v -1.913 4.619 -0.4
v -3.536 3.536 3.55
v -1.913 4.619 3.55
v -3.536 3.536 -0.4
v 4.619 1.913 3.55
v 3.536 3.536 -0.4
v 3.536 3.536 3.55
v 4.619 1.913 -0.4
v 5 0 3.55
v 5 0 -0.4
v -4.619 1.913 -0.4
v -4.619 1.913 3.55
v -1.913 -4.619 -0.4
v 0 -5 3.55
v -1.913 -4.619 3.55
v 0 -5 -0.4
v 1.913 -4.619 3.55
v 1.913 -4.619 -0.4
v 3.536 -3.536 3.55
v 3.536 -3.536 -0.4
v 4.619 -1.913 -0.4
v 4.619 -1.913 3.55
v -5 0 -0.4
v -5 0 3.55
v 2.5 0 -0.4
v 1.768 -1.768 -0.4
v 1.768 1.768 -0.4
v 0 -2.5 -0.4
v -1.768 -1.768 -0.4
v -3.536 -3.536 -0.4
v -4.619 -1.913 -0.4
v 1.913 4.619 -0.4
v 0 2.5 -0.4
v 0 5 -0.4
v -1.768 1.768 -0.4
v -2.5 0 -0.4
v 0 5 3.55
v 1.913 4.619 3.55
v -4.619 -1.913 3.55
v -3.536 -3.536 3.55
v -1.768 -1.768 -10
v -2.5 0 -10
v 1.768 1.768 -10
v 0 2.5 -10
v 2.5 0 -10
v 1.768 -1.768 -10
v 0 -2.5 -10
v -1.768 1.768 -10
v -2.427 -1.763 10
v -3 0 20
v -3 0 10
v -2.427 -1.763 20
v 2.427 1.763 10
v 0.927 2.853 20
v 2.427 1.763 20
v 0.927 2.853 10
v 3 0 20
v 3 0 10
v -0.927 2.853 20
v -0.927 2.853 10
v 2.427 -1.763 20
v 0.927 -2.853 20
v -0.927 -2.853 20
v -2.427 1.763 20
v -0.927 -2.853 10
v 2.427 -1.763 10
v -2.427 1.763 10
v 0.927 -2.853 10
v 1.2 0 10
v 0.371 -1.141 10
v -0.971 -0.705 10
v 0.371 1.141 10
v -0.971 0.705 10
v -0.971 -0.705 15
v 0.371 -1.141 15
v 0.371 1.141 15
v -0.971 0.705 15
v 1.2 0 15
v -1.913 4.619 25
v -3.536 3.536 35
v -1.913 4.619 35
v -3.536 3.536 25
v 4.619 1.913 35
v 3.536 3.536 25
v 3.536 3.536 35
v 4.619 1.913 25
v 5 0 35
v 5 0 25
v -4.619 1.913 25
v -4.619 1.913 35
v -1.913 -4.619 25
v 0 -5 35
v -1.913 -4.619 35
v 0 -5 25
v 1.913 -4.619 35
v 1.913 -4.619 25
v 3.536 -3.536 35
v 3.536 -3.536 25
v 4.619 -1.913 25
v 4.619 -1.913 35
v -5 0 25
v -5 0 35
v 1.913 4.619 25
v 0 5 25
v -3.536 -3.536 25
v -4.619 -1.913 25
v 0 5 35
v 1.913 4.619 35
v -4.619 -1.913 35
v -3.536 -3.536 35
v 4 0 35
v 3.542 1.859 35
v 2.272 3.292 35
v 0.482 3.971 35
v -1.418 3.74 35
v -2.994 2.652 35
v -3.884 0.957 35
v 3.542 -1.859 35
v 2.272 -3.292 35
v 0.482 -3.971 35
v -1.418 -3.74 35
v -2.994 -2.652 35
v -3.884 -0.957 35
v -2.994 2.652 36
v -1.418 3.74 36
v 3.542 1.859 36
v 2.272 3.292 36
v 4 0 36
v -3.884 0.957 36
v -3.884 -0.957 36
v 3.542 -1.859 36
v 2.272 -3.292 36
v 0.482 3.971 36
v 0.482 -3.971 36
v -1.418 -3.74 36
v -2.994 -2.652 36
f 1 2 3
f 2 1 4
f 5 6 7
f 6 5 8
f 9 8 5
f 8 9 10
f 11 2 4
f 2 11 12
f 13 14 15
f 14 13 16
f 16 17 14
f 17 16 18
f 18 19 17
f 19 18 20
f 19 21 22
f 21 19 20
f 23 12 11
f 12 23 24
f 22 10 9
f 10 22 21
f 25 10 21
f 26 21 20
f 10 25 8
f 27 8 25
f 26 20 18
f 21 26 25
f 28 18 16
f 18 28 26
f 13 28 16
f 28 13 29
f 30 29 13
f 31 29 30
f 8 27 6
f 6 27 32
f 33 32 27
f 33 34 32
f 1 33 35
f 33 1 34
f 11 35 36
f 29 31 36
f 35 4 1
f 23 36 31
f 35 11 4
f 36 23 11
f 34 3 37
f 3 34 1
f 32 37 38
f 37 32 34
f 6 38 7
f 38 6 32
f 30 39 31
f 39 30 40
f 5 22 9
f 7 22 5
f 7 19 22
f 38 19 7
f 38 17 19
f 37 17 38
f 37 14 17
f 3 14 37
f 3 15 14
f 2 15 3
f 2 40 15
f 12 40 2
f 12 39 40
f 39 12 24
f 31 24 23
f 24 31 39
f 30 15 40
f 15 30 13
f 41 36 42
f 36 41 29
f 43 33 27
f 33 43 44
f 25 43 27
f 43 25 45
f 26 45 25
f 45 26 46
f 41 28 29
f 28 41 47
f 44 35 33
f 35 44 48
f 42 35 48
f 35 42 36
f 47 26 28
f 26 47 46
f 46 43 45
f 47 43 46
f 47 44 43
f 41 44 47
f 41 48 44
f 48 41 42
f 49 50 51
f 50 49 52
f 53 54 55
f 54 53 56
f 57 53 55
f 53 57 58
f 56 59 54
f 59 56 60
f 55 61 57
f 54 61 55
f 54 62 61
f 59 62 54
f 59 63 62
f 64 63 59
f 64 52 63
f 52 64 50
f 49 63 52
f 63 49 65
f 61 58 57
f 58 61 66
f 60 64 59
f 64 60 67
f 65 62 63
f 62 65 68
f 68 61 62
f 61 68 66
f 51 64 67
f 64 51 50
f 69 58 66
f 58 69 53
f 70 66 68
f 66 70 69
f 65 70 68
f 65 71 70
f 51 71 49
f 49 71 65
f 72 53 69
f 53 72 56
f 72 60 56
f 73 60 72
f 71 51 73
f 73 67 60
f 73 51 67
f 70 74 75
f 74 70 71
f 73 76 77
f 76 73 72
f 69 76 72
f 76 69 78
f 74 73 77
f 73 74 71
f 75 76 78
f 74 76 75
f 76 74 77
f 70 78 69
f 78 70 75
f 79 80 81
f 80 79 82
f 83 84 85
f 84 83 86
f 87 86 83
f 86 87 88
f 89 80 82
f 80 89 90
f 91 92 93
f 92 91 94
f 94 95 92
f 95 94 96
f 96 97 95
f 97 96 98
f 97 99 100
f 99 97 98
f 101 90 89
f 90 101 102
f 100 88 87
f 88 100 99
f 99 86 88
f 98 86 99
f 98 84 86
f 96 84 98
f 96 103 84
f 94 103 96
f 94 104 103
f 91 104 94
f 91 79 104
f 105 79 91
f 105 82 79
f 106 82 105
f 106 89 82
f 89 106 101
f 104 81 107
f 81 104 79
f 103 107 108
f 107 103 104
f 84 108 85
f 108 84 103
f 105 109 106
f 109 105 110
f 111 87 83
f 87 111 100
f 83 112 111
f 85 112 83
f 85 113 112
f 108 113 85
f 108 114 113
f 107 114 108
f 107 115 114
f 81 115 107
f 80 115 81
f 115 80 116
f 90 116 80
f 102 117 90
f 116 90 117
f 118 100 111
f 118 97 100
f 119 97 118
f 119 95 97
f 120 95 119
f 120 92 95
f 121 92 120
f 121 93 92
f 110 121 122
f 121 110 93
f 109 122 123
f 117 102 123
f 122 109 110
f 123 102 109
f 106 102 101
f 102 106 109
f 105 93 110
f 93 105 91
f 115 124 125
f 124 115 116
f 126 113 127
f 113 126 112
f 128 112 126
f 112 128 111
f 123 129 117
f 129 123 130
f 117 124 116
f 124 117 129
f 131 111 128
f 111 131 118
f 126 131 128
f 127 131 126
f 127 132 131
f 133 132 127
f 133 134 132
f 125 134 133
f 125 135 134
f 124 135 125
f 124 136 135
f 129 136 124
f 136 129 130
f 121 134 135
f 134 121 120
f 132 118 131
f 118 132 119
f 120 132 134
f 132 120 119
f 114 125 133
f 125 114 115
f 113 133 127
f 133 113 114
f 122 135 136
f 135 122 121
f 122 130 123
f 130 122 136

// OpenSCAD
// Parameters
shank_diameter = 5; //[2.5:10:0.1]
length_under_head = 10; //[5:20:0.5]
head_diameter = 10; //[6:20:0.1]
head_height = 3.95; //[2:8:0.05]
threaded = 0; //[0:1:1]
drive_type_none = 1; //[0:1:1]
tip_type_chamfer = 1; //[0:1:1]
eps_overlap = 0.8; //[0.2:2:0.1]
shank_radius = 2.5; //[1.25:5:0.1]
head_radius = 5; //[3:10:0.1]
head_crown_radius = 6; //[3:12:0.1]
head_crown_center_z = 1.5; //[−2:6:0.1]
tip_chamfer_height = 1.2; //[0.5:3:0.1]
tip_point_radius2 = 0.6; //[0:2.5:0.1]
drive_recess_radius = 3; //[1.5:4.5:0.1]
drive_recess_depth = 2; //[0.8:3.5:0.1]
drive_recess_slot_width = 1; //[0.6:2:0.1]
drive_recess_overlap_z = 0.5; //[0.2:1.5:0.1]

// Screw and Washer
module screw_and_washer() {
  color("DimGray") {
    // Shank
    translate([0, 0, -length_under_head/2])
      cylinder(h=length_under_head, r=shank_radius, center=true);

    // Tip Chamfer
    translate([0, 0, -length_under_head + tip_chamfer_height/2])
      cylinder(h=tip_chamfer_height, r1=shank_radius, r2=tip_point_radius2, center=true);

    // Head
    intersection() {
      translate([0, 0, head_height/2 - eps_overlap/2])
        cylinder(h=head_height, r=head_radius, center=true);
      translate([0, 0, head_crown_center_z])
        sphere(r=head_crown_radius, center=true);
      translate([0, 0, head_height/2 - eps_overlap/2])
        cube([2*head_diameter, 2*head_diameter, head_height + 2*eps_overlap], center=true);
    }

    // Optional Drive Recess
    if (drive_type_none == 0) {
      difference() {
        translate([0, 0, head_height - (drive_recess_depth + drive_recess_overlap_z)/2])
          cylinder(h=drive_recess_depth + drive_recess_overlap_z, r=drive_recess_radius, center=true);
        translate([0, 0, head_height - (drive_recess_depth + drive_recess_overlap_z)/2])
          union() {
            cube([2*drive_recess_radius, drive_recess_slot_width, drive_recess_depth + drive_recess_overlap_z], center=true);
            cube([drive_recess_slot_width, 2*drive_recess_radius, drive_recess_depth + drive_recess_overlap_z], center=true);
          }
      }
    }
  }
}

// PCB Spacer
module pcb_spacer() {
  color("Silver") {
    // Spacer body
    difference() {
      cylinder(h=10, r=3, center=true);
      translate([0, 0, -5])
        cylinder(h=10, r=1.2, center=true);
    }
  }
}

// Buzzer
module buzzer() {
  color("Black") {
    // Buzzer body
    cylinder(h=10, r=5, center=true);
    // Buzzer top
    translate([0, 0, 5])
      cylinder(h=2, r=4, center=true);
  }
}

// Assembly
module assembly() {
  translate([0, 0, 0]) screw_and_washer();
  translate([0, 0, 15]) pcb_spacer();
  translate([0, 0, 30]) buzzer();
}

assembly();
